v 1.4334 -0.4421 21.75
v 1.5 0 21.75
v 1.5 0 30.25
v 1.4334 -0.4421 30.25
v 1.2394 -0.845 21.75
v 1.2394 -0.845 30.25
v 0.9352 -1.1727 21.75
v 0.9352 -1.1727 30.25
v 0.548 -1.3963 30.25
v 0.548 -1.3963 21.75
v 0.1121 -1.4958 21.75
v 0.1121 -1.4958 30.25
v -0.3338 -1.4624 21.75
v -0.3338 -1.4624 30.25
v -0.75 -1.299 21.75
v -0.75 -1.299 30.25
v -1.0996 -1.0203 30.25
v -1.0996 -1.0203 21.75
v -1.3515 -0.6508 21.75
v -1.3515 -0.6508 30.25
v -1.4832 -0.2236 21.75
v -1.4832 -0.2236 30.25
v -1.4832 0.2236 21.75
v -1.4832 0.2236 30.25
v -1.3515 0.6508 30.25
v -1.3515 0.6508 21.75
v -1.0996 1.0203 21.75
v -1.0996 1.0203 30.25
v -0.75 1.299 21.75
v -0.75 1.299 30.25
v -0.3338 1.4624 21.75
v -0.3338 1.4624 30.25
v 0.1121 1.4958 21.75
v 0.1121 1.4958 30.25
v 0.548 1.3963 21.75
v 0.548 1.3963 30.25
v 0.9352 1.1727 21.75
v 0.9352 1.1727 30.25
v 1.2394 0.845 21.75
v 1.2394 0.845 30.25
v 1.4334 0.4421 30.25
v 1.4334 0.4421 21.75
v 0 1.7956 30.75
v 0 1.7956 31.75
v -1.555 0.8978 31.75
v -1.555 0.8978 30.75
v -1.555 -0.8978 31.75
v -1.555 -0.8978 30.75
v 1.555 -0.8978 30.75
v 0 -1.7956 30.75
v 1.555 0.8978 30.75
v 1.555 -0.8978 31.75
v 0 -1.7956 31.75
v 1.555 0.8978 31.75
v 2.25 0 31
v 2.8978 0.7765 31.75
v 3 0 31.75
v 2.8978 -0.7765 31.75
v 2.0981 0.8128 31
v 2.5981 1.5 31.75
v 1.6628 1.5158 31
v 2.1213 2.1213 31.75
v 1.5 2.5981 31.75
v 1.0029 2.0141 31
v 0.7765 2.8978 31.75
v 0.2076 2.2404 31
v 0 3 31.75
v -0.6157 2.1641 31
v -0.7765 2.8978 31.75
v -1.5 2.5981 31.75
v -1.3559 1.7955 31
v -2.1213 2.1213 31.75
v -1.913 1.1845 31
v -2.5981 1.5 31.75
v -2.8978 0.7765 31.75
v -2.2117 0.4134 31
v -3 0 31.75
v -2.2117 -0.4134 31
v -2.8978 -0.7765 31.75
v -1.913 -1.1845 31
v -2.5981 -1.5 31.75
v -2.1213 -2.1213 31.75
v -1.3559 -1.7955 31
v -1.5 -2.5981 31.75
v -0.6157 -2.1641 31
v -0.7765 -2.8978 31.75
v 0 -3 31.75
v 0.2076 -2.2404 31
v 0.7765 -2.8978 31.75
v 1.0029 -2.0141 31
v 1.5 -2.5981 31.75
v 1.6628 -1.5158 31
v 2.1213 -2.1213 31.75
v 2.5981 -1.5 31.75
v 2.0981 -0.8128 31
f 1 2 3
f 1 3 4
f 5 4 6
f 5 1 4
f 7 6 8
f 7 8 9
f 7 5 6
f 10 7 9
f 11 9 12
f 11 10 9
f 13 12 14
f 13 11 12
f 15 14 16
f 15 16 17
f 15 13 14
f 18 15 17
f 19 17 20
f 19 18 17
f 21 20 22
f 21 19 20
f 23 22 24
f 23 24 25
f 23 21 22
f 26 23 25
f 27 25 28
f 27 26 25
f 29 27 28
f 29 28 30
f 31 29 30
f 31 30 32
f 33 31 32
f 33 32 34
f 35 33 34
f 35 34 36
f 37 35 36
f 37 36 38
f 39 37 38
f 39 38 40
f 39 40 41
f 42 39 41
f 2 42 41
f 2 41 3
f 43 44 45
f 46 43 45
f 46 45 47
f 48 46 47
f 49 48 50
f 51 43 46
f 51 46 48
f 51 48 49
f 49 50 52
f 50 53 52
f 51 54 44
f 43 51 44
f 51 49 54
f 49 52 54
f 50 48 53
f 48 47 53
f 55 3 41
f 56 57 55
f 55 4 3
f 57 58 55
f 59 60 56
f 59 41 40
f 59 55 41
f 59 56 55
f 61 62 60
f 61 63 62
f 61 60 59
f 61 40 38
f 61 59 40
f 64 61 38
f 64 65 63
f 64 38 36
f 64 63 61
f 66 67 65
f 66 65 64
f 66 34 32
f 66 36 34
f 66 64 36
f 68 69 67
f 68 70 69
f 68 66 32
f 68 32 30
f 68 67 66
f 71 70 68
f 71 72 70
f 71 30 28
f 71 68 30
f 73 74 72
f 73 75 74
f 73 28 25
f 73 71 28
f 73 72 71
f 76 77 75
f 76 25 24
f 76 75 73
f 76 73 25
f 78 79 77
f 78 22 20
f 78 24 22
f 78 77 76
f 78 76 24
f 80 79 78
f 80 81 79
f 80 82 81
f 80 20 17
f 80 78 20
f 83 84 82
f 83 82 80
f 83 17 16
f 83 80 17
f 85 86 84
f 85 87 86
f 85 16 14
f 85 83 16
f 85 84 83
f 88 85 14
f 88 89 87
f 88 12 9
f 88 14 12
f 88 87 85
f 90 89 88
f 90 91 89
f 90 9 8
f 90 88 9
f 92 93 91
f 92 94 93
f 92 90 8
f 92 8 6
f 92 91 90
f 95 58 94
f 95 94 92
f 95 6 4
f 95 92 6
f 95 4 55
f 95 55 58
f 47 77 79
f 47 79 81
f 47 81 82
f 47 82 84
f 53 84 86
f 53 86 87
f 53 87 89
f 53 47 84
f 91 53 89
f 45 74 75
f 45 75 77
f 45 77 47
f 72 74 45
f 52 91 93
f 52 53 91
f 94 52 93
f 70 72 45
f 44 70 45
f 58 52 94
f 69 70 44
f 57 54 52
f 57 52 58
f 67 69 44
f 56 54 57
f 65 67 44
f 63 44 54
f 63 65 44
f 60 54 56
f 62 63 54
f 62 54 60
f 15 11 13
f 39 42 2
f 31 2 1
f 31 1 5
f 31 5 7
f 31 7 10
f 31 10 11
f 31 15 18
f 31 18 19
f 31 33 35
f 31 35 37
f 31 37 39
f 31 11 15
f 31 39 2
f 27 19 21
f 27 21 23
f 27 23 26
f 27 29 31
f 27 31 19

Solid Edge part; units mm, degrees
sketch "Sketch1" plane through (0, 0, 0) normal (0, 0, 1) x (1, 0, 0)
  circle A0 centre (0, 0) radius 1.5
extrude "Protrusion1" add sketch "Sketch1" along normal blind 30
sketch "Sketch2" plane through (0, 0, 30) normal (0, 0, 1) x (1, 0, 0)
  circle A0 centre (0, 0) radius 3
extrude "ExtrudedProtrusion_2" add sketch "Sketch2" along normal blind 1.75
chamfer "Chamfer_1" distance 1.75 angle 45 1 edges at (-3, 0, 30)
sketch "Sketch3" plane through (0, 0, 31.75) normal (0, 0, 1) x (0, 1, 0)
  line L0 (0.8978, -1.555) -> (1.7956, 0)
  line L1 (1.7956, 0) -> (0.8978, 1.555)
  line L2 (0.8978, 1.555) -> (-0.8978, 1.555)
  line L3 (-0.8978, 1.555) -> (-1.7956, 0)
  line L4 (-1.7956, 0) -> (-0.8978, -1.555)
  line L5 (-0.8978, -1.555) -> (0.8978, -1.555)
extrude "ExtrudedCutout_1" cut sketch "Sketch3" against normal blind 1
sketch "Sketch4" plane through (0, 0, 0) normal (0, 0, -1) x (0, 1, 0)
  circle A0 centre (0, 0) radius 1.9215
extrude "ExtrudedCutout_2" cut sketch "Sketch4" against normal blind 21.75
revolve "RevolvedCutout1" [suppressed]
fillet "Round_1" [suppressed]
properties material "Iron, grey cast type 20"
